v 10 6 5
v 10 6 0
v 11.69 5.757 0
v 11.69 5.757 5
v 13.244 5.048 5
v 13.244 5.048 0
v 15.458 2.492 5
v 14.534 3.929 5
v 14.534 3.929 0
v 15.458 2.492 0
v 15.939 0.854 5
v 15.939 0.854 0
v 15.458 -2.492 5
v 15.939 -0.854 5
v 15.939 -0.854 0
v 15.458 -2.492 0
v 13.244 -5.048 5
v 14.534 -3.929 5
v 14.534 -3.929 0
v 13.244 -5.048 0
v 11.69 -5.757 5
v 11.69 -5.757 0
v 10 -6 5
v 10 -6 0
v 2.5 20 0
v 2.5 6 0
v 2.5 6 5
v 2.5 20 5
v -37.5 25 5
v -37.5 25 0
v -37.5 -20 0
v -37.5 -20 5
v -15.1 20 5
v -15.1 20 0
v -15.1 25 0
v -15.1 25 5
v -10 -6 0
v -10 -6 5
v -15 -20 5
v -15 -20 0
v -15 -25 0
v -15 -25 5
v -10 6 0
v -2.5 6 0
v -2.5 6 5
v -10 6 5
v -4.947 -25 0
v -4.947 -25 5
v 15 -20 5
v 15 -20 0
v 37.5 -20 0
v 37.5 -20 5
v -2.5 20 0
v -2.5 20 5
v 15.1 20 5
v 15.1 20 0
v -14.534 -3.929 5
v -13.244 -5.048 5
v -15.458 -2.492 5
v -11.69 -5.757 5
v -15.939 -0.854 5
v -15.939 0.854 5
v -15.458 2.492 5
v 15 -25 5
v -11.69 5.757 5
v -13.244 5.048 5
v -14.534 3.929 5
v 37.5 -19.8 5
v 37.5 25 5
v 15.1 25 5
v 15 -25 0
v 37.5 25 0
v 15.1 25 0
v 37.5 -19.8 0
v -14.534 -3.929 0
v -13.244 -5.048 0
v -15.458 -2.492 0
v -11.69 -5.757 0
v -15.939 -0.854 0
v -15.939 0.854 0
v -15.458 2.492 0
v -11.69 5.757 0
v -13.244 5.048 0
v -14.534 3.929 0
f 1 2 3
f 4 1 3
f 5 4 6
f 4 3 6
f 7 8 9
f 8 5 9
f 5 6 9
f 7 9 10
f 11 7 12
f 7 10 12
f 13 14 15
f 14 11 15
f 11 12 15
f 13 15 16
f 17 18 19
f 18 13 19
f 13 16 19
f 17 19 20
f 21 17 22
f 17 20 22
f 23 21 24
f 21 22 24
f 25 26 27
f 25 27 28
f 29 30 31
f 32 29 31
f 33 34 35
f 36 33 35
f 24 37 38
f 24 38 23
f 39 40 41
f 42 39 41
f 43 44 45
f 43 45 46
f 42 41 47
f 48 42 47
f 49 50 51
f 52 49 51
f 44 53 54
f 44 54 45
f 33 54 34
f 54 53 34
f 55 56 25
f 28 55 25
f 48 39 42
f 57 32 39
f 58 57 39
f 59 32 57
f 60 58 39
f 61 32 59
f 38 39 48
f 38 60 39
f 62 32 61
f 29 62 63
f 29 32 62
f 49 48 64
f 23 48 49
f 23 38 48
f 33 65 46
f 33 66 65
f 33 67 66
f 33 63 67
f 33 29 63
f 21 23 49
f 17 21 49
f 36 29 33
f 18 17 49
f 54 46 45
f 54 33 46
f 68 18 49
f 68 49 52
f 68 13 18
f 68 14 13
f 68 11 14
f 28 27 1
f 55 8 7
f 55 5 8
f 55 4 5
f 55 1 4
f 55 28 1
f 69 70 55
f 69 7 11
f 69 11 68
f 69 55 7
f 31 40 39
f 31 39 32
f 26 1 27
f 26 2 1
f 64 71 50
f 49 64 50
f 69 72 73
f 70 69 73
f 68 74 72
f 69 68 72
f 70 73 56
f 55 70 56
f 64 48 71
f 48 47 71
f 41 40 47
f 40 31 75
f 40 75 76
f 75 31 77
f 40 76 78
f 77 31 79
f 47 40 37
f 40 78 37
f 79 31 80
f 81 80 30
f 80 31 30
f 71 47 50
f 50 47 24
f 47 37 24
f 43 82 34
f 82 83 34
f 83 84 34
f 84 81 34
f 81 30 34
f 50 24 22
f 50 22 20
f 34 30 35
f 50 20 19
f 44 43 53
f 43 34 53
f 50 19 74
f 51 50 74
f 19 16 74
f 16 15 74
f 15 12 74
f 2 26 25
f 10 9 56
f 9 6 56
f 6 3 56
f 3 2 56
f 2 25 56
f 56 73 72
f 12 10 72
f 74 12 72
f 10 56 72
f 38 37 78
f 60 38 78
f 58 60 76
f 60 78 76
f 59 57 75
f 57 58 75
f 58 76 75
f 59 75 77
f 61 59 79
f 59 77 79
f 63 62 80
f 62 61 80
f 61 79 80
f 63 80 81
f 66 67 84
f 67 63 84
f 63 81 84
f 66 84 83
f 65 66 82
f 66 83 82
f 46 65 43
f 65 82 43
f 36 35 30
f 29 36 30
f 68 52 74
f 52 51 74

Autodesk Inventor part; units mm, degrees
ref_plane "YZ Plane" through (0, 0, 0) normal (1, 0, 0) x (0, 1, 0)
ref_plane "XZ Plane" through (0, 0, 0) normal (0, 1, 0) x (-1, 0, 0)
ref_plane "XY Plane" through (0, 0, 0) normal (0, 0, 1) x (1, 0, 0)
sketch "Sketch1" plane through (0, 0, 0) normal (0, 0, 1) x (1, 0, 0)
  line L0 (-37.5, -25) -> (37.5, -25)
  line L1 (37.5, -25) -> (37.5, 25)
  line L2 (37.5, 25) -> (-37.5, 25)
  line L3 (-37.5, 25) -> (-37.5, -25)
  line L4 (-37.5, -25) -> (37.5, 25) construction
  line L5 (37.5, -25) -> (-37.5, 25) construction
  line L6 (-15.1, 25) -> (15.1, 25)
  line L7 (15.1, 25) -> (15.1, 20)
  line L8 (15.1, 20) -> (-15.1, 20)
  line L9 (-15.1, 20) -> (-15.1, 25)
  line L10 (-15.1, 25) -> (15.1, 20) construction
  line L11 (15.1, 25) -> (-15.1, 20) construction
  line L12 (-4.9474, -25) -> (-37.5, -25)
  line L13 (-37.5, -25) -> (-37.5, -21.6221)
  line L14 (74.3708, -25) -> (124.7526, -25)
  line L15 (0, 0) -> (0, -25) construction
  line L16 (24.4526, -25) -> (37.5, -25)
  line L17 (37.5, -25) -> (37.5, -19.8)
  line L18 (-10, 0) -> (10, 0) construction
  line L19 (-10, -6) -> (10, -6)
  line L20 (10, 6) -> (-10, 6)
  arc A0 (-10, 6) -> (-10, -6) centre (-10, 0) ccw
  arc A1 (10, -6) -> (10, 6) centre (10, 0) ccw
  line L21 (-2.5, 6) -> (2.5, 6)
  line L22 (2.5, 6) -> (2.5, 20)
  line L23 (2.5, 20) -> (-2.5, 20)
  line L24 (-2.5, 20) -> (-2.5, 6)
  line L25 (-2.5, 6) -> (2.5, 20) construction
  line L26 (2.5, 6) -> (-2.5, 20) construction
  line L27 (-37.5, -25) -> (-20.5763, -25)
  line L28 (-37.5, -20) -> (-37.5, -25)
  line L29 (20.5763, -25) -> (37.5, -25)
  line L30 (37.5, -25) -> (37.5, -20)
  line L31 (-15, -25) -> (15, -25)
  line L32 (15, -25) -> (15, -20)
  line L33 (15, -20) -> (-15, -20) construction
  line L34 (-15, -20) -> (-15, -25)
  line L35 (-15, -25) -> (15, -20) construction
  line L36 (15, -25) -> (-15, -20) construction
  line L37 (-15, -20) -> (-37.5, -20)
  line L38 (15, -20) -> (37.5, -20)
  point P0 (0, 22.5)
  point P1 (15.1, 25)
  point P2 (-15.1, 25)
  point P3 (0, 13)
  point P4 (2.5, 20)
  point P5 (0, -22.5)
  dimension "d1" = 50
  dimension "d10" = 5
  dimension "d11" = 30.2
  dimension "d25" = 12
  dimension "d26" = 20
  dimension "d27" = 5
  dimension "d35" = 5
  dimension "d36" = 30
  dimension "d37" = 75
extrude "Extrusion1" add sketch "Sketch1" along normal blind 5 contours L34 L37 L3 L2 L9 L8 L24 L20 A0 L19 A1 L22 L7 L1 L38 L32 L0
properties part number "upper-back-plate-support"
